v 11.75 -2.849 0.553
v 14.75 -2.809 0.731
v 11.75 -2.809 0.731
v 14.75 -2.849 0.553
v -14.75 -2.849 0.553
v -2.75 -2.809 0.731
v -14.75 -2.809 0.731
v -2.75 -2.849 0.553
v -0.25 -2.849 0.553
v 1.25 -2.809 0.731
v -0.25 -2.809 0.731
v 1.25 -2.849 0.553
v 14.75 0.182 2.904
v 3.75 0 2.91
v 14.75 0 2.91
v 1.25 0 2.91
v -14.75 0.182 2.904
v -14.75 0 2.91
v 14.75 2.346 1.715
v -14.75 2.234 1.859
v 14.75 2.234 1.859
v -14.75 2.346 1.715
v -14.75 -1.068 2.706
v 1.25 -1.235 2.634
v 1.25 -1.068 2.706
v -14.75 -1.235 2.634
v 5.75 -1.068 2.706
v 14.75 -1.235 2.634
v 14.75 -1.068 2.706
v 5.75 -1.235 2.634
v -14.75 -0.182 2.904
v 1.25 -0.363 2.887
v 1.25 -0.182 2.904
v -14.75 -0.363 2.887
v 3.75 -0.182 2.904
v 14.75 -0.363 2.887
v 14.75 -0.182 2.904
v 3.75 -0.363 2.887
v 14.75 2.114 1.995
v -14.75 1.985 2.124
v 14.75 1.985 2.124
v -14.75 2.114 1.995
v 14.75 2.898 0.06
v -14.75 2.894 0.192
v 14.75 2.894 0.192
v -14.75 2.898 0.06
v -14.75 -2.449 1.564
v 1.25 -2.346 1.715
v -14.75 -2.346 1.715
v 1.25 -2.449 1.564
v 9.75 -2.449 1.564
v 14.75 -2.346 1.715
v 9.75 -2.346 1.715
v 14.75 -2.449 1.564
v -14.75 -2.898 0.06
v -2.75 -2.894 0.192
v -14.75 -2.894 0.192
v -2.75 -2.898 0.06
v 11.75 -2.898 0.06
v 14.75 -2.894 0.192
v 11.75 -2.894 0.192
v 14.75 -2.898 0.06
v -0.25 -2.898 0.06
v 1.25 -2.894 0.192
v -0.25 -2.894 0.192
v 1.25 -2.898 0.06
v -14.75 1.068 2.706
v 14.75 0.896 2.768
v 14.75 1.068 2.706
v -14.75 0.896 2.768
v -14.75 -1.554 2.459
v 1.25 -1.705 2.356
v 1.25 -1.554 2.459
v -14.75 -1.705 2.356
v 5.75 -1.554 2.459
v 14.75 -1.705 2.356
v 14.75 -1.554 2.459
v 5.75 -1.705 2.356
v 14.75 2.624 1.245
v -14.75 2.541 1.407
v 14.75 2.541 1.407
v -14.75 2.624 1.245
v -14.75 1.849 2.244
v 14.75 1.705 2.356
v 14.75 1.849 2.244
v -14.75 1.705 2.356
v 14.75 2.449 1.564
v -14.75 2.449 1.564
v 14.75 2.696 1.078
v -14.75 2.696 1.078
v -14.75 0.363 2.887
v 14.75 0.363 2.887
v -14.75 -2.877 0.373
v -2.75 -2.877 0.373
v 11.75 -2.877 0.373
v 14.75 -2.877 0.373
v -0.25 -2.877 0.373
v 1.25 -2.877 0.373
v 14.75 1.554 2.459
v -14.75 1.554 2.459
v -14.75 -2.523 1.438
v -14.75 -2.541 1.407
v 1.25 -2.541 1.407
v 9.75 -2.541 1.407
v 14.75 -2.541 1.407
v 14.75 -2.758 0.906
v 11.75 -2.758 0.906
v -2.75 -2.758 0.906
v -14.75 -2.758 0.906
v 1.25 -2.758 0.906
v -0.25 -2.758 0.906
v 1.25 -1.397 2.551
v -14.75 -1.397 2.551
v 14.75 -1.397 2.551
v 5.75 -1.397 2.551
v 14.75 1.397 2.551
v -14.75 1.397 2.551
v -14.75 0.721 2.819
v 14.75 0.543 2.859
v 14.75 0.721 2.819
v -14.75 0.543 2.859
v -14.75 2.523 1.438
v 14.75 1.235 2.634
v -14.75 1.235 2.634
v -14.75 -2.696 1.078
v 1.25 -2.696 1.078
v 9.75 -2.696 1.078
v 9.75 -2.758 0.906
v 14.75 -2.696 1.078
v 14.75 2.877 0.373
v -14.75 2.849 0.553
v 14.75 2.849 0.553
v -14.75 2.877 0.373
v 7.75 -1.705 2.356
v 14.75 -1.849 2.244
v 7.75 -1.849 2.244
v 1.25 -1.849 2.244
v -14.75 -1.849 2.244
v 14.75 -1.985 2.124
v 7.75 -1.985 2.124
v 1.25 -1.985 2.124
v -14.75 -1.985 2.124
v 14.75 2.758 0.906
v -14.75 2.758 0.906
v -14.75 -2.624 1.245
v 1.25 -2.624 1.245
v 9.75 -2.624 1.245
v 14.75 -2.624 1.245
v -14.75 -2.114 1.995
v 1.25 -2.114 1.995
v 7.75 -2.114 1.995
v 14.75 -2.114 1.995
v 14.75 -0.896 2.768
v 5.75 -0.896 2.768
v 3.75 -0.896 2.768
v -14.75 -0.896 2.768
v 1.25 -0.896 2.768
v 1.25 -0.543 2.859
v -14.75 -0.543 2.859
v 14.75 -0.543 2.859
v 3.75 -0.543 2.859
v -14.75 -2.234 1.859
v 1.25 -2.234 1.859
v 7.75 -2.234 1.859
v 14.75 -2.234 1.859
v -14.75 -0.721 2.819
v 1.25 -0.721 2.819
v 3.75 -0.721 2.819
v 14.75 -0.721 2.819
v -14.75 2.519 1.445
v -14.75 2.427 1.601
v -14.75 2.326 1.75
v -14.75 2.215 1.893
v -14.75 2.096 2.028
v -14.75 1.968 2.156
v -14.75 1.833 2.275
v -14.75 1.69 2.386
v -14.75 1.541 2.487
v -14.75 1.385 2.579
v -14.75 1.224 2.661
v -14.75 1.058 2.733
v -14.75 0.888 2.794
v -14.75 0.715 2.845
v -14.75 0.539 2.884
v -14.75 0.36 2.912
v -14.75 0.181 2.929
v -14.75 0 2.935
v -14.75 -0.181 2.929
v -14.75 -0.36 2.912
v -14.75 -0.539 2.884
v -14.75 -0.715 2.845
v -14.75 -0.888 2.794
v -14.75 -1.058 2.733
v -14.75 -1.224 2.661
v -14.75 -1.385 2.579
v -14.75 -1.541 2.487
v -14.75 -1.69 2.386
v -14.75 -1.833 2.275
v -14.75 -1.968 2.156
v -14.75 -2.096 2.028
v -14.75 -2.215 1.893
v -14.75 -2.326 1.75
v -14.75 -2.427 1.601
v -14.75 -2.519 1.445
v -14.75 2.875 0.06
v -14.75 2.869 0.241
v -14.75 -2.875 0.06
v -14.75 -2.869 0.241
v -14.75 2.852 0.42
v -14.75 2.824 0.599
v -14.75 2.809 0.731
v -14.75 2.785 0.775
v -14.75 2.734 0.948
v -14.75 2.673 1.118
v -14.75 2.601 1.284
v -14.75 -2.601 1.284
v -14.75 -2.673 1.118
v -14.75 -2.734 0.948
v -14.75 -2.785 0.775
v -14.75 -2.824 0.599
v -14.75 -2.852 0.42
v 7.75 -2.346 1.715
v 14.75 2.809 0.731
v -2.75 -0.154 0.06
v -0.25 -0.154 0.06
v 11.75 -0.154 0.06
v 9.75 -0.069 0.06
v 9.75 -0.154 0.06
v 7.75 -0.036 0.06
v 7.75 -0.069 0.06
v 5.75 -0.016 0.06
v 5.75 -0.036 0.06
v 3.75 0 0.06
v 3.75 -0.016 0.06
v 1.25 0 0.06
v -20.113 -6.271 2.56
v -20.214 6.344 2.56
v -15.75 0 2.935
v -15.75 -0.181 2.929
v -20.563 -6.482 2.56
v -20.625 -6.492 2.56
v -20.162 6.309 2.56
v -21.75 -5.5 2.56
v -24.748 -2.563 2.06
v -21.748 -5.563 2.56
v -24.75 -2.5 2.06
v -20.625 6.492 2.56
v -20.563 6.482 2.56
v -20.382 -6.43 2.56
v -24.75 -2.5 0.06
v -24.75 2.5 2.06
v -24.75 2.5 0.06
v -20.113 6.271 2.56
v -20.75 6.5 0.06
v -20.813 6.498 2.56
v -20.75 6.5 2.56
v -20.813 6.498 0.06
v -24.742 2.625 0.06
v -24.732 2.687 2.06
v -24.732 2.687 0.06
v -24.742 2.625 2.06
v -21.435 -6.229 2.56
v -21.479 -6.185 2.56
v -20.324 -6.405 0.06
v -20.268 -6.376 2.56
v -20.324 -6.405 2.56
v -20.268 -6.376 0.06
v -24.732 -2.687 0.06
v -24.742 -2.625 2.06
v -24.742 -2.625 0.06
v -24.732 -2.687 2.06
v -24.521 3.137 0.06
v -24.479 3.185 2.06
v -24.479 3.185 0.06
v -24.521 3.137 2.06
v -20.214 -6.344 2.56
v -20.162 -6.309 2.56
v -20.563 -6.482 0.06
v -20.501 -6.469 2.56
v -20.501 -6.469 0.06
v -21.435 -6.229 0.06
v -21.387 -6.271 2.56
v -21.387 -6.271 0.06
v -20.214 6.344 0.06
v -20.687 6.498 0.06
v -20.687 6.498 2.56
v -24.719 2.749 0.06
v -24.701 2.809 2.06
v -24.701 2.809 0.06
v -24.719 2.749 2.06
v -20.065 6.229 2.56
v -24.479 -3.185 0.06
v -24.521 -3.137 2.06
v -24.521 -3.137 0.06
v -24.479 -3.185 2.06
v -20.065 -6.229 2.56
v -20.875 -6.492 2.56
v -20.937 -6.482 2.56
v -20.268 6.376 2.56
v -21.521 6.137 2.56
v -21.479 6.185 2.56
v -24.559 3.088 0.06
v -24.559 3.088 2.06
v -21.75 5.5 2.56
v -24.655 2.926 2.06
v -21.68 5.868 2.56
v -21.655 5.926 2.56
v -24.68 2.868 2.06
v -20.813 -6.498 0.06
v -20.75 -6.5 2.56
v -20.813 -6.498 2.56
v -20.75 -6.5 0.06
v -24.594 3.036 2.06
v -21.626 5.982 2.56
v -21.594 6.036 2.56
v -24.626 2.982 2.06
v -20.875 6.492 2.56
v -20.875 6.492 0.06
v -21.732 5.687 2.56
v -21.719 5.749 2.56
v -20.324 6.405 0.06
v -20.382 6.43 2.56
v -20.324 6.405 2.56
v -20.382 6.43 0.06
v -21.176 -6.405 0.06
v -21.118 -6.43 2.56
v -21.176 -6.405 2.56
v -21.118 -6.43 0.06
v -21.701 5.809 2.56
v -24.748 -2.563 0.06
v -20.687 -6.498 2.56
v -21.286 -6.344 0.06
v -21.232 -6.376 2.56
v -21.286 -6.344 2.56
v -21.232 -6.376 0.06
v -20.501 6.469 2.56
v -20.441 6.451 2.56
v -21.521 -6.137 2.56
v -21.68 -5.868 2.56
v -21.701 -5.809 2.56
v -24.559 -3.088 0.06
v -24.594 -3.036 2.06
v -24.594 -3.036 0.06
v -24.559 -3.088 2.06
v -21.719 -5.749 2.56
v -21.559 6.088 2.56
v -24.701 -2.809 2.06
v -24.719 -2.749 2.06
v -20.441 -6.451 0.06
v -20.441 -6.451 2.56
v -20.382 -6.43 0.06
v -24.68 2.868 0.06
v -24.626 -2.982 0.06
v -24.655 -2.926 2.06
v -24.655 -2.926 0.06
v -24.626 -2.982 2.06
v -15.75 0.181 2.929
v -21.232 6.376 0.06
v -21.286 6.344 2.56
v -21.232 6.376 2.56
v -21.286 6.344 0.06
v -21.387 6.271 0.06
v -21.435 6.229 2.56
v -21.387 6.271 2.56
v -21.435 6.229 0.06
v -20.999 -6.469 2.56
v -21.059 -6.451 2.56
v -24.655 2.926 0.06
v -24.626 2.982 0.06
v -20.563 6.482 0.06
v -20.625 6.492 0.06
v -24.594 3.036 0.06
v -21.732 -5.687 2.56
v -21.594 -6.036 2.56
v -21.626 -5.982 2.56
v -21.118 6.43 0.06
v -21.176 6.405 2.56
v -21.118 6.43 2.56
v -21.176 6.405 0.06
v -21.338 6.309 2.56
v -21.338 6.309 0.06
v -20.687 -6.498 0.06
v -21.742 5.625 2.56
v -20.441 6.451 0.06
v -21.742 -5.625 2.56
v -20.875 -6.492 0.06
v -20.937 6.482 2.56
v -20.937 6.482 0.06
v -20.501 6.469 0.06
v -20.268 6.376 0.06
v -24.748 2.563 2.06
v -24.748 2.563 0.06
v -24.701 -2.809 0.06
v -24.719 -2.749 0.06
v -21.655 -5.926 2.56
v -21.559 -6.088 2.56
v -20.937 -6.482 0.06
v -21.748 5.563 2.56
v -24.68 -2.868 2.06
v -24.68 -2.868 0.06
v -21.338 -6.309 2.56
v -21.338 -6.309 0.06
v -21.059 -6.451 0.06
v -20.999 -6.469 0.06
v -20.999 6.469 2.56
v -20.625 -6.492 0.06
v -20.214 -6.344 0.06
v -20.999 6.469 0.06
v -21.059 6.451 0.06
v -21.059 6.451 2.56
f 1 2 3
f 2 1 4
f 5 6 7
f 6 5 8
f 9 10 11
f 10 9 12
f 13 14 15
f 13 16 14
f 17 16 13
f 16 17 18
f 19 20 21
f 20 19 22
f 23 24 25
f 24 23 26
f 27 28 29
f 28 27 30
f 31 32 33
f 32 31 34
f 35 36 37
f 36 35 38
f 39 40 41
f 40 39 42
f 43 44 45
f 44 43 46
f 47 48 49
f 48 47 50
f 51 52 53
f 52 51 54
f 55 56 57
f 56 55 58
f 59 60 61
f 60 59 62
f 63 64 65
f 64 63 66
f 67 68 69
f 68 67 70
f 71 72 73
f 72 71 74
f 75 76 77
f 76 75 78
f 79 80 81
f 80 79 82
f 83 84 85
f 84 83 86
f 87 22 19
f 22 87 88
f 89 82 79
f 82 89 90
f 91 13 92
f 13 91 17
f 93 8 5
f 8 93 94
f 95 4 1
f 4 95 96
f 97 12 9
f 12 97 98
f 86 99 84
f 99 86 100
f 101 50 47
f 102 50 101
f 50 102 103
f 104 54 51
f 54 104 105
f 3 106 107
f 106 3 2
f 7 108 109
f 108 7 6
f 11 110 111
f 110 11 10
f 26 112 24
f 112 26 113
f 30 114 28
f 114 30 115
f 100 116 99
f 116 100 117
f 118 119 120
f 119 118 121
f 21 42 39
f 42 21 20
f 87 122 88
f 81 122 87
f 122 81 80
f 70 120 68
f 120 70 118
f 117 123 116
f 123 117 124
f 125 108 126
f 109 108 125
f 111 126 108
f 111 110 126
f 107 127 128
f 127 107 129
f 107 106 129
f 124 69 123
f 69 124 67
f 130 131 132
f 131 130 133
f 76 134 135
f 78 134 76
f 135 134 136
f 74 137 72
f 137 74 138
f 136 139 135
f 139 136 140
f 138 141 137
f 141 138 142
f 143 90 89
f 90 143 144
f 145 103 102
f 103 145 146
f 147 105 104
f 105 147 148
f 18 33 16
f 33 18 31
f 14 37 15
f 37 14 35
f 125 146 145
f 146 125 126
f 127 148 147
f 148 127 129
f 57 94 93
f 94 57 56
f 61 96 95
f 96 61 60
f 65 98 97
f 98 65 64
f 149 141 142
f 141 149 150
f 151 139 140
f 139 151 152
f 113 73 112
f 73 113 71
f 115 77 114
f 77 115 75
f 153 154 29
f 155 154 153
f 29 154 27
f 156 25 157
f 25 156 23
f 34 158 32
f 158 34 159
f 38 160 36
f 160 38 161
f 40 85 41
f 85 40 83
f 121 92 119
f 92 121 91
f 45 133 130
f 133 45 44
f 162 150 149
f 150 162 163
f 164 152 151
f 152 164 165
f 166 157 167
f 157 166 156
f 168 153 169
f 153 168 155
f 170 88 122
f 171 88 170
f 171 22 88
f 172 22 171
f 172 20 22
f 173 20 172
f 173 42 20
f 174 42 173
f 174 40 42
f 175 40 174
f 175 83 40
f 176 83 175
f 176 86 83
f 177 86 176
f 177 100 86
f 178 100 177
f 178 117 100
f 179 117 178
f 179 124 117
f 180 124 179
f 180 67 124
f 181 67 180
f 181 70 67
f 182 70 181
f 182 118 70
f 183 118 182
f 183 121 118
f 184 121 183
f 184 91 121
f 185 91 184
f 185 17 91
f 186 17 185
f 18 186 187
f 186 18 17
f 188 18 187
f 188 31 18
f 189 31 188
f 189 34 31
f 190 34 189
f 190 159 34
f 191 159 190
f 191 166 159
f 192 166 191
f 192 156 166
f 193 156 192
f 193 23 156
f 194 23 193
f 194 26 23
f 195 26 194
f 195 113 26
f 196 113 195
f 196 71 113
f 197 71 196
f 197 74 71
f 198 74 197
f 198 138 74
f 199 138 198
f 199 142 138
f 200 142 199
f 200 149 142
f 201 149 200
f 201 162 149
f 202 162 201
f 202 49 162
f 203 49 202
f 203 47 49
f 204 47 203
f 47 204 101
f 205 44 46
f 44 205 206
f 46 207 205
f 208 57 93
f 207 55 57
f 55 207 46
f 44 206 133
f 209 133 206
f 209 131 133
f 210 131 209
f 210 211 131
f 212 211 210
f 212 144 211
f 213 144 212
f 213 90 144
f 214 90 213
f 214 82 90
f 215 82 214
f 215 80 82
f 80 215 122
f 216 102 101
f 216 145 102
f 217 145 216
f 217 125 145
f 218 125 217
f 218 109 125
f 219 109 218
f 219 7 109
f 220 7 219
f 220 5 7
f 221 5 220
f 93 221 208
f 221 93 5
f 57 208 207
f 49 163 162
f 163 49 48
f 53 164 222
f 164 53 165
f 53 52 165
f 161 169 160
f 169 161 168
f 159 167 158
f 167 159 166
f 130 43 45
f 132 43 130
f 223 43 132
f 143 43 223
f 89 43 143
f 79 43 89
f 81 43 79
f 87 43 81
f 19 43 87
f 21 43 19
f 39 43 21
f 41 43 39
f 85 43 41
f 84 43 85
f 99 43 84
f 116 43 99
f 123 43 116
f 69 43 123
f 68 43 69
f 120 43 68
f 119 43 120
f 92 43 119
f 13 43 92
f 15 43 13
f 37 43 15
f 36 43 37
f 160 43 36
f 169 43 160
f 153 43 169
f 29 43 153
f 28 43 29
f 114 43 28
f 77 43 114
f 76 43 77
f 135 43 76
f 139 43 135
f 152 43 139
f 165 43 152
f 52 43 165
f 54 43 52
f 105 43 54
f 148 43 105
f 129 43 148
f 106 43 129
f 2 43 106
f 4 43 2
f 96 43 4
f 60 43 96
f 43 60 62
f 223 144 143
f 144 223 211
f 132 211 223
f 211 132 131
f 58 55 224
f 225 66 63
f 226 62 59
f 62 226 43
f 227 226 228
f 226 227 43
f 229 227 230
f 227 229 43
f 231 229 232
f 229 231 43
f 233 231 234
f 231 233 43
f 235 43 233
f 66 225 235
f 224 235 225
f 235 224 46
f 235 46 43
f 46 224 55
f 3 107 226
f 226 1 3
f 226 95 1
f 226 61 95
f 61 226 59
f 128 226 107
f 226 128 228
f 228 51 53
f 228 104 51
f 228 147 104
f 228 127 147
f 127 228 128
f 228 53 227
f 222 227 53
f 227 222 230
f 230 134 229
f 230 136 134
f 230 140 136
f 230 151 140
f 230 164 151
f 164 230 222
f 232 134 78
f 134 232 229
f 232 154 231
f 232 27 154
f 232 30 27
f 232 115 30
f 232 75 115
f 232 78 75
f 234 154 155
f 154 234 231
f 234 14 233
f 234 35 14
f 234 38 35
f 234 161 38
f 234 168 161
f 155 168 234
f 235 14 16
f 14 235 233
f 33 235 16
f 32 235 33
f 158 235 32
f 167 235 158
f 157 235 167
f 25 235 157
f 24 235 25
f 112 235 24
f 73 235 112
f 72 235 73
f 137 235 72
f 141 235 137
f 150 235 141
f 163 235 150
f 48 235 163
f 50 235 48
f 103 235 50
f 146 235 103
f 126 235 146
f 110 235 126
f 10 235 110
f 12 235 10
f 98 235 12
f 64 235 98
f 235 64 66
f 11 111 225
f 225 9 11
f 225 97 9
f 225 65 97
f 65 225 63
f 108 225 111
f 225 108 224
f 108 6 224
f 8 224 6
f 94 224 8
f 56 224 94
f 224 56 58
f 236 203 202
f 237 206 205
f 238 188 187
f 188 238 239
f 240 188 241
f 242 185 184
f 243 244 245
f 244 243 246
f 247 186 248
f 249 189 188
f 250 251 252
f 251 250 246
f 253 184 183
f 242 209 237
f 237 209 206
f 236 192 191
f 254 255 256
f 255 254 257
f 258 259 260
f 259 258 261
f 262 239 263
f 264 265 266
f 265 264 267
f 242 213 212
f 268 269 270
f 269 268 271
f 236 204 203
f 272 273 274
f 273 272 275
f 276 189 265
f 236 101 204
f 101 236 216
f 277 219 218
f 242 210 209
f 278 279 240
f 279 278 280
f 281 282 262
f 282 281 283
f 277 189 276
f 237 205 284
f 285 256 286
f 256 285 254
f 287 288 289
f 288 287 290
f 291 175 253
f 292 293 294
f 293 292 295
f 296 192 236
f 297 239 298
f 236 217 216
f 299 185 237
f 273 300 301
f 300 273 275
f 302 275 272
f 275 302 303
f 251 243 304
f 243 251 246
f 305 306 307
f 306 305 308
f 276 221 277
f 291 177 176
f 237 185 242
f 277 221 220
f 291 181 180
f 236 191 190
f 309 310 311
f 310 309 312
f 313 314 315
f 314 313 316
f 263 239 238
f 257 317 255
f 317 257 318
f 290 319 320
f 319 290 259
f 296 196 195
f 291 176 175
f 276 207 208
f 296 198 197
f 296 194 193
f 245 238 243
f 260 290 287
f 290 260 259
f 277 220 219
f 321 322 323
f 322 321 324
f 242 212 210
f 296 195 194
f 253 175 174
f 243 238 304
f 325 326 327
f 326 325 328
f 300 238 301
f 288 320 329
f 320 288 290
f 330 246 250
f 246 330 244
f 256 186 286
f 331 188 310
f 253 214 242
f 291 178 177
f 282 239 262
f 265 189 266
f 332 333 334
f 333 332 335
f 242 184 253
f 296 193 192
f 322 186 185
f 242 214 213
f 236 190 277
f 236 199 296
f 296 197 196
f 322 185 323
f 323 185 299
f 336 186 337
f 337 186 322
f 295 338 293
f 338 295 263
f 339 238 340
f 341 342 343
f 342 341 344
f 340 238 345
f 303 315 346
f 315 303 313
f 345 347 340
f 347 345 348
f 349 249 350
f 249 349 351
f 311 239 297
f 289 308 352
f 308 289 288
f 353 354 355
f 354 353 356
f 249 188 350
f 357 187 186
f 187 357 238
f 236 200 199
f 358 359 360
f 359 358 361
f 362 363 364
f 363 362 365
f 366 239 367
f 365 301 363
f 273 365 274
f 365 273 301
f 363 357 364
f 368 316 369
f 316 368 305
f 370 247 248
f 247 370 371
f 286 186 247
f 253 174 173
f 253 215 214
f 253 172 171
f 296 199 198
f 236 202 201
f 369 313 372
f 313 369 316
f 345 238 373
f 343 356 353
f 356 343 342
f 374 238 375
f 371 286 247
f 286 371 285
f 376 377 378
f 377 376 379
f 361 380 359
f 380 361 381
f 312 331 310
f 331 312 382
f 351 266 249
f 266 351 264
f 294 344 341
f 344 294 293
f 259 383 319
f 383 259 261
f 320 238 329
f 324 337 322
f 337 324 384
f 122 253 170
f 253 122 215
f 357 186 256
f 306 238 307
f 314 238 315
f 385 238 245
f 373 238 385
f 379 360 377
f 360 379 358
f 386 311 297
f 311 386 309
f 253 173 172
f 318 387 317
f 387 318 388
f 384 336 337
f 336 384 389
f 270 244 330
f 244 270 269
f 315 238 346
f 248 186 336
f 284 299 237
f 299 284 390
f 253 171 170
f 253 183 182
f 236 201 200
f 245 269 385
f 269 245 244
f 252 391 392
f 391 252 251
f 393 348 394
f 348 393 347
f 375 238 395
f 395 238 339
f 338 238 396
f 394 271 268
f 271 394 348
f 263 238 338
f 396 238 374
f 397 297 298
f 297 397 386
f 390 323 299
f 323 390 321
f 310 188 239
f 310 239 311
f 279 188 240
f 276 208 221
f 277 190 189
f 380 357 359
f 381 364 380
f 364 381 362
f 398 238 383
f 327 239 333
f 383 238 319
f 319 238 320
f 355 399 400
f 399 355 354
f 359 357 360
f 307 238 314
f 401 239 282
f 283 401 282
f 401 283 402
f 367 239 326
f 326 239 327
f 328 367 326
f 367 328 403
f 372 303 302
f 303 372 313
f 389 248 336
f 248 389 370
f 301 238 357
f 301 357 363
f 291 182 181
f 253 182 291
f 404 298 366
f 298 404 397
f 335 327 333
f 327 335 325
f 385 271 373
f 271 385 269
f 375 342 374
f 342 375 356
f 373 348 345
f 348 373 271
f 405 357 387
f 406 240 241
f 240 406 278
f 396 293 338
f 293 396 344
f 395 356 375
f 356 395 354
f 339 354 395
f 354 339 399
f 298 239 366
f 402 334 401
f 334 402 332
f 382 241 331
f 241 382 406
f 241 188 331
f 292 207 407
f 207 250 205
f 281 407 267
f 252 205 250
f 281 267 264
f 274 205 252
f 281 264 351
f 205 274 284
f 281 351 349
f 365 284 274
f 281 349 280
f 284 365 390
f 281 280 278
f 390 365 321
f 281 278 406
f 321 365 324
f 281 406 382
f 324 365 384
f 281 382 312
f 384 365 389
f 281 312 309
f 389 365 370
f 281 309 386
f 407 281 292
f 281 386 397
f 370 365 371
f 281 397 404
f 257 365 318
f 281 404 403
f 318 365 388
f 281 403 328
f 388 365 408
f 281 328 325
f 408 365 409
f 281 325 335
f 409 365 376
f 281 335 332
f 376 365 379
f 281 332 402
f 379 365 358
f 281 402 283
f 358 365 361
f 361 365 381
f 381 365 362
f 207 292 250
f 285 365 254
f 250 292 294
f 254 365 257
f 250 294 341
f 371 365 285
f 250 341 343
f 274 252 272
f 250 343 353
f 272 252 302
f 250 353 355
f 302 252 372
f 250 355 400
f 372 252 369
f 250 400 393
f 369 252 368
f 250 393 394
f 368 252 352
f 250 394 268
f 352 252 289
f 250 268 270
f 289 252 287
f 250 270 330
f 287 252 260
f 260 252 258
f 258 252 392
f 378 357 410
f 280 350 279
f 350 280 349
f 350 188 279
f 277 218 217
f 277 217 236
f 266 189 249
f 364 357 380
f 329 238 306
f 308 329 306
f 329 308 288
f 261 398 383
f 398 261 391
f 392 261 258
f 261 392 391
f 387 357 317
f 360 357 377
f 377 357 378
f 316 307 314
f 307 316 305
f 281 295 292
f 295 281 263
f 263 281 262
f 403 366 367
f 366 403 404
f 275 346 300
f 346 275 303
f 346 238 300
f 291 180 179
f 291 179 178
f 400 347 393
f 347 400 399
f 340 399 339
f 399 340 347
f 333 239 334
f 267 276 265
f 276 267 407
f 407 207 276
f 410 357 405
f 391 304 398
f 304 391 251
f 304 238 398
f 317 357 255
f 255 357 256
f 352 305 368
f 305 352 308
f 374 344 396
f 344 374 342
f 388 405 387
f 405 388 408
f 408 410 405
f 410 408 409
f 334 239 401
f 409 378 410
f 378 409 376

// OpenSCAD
// preview[view:north, tilt:bottom]

/* [Global] */

key = [1,2,3,4,5,0,1];

/* [Body] */

body_length = 29.5;
body_diameter = 2.9;

/* [Handle] */
handle = 1; // [1:Yes, 0:No]

/* [Cut] */
cut_spacing = 0.5;
cut_angle_step = 18;

/* [Quality] */

$fn = 100;

/* [Hidden] */

preview_tab = "";

module highlight(this_tab) {
  if (preview_tab == this_tab) {
    color("Chocolate") children();
  } else {
    color("NavajoWhite") children();
  }
}

module body(l = body_length, d = body_diameter) {
    difference() {
        rotate([0,90,0]) cylinder(l, d, d);
        translate([-0.25,-3,-0.05]) cube([body_length+0.5,6,6]);
    }
}

module cut(cuts, spacing = 0.5) {
    for(a = [0:len(cuts)-1]) {
        translate([3 + a*2,0,0])
        rotate([90+cuts[a]*cut_angle_step,0,0])
        translate([0,0,-0.01])
        difference() {
            cube([2 + spacing,3,3]);
//            translate([(2+spacing)/2,0,0]) cube([.5,3,3]); // support
        }
    }
}

module handle() {
    highlight("Handle") 
    hull() {
        translate([body_length,0,-0.06]) difference() {
            rotate([0,90,0]) cylinder(1,2.9-0.025,2.9-0.025);
            translate([-3,-3,0]) cube([6,6,6]);
        }
        translate([body_length+6,5.5,-2.56]) cylinder(2.5);
        translate([body_length+6,-5.5,-2.56]) cylinder(2.5);
        translate([body_length+9,2.5,-2.06]) cylinder(2);
        translate([body_length+9,-2.5,-2.06]) cylinder(2);
    }
}

module main() {
    translate([0,0,-0.01])
    difference() {
        highlight("Body") body();
        highlight("Cut") cut(key, cut_spacing);
    }
}

translate([29.5/2,0]) rotate([180,0,180]) {
    main();
    if(handle) handle();
}
